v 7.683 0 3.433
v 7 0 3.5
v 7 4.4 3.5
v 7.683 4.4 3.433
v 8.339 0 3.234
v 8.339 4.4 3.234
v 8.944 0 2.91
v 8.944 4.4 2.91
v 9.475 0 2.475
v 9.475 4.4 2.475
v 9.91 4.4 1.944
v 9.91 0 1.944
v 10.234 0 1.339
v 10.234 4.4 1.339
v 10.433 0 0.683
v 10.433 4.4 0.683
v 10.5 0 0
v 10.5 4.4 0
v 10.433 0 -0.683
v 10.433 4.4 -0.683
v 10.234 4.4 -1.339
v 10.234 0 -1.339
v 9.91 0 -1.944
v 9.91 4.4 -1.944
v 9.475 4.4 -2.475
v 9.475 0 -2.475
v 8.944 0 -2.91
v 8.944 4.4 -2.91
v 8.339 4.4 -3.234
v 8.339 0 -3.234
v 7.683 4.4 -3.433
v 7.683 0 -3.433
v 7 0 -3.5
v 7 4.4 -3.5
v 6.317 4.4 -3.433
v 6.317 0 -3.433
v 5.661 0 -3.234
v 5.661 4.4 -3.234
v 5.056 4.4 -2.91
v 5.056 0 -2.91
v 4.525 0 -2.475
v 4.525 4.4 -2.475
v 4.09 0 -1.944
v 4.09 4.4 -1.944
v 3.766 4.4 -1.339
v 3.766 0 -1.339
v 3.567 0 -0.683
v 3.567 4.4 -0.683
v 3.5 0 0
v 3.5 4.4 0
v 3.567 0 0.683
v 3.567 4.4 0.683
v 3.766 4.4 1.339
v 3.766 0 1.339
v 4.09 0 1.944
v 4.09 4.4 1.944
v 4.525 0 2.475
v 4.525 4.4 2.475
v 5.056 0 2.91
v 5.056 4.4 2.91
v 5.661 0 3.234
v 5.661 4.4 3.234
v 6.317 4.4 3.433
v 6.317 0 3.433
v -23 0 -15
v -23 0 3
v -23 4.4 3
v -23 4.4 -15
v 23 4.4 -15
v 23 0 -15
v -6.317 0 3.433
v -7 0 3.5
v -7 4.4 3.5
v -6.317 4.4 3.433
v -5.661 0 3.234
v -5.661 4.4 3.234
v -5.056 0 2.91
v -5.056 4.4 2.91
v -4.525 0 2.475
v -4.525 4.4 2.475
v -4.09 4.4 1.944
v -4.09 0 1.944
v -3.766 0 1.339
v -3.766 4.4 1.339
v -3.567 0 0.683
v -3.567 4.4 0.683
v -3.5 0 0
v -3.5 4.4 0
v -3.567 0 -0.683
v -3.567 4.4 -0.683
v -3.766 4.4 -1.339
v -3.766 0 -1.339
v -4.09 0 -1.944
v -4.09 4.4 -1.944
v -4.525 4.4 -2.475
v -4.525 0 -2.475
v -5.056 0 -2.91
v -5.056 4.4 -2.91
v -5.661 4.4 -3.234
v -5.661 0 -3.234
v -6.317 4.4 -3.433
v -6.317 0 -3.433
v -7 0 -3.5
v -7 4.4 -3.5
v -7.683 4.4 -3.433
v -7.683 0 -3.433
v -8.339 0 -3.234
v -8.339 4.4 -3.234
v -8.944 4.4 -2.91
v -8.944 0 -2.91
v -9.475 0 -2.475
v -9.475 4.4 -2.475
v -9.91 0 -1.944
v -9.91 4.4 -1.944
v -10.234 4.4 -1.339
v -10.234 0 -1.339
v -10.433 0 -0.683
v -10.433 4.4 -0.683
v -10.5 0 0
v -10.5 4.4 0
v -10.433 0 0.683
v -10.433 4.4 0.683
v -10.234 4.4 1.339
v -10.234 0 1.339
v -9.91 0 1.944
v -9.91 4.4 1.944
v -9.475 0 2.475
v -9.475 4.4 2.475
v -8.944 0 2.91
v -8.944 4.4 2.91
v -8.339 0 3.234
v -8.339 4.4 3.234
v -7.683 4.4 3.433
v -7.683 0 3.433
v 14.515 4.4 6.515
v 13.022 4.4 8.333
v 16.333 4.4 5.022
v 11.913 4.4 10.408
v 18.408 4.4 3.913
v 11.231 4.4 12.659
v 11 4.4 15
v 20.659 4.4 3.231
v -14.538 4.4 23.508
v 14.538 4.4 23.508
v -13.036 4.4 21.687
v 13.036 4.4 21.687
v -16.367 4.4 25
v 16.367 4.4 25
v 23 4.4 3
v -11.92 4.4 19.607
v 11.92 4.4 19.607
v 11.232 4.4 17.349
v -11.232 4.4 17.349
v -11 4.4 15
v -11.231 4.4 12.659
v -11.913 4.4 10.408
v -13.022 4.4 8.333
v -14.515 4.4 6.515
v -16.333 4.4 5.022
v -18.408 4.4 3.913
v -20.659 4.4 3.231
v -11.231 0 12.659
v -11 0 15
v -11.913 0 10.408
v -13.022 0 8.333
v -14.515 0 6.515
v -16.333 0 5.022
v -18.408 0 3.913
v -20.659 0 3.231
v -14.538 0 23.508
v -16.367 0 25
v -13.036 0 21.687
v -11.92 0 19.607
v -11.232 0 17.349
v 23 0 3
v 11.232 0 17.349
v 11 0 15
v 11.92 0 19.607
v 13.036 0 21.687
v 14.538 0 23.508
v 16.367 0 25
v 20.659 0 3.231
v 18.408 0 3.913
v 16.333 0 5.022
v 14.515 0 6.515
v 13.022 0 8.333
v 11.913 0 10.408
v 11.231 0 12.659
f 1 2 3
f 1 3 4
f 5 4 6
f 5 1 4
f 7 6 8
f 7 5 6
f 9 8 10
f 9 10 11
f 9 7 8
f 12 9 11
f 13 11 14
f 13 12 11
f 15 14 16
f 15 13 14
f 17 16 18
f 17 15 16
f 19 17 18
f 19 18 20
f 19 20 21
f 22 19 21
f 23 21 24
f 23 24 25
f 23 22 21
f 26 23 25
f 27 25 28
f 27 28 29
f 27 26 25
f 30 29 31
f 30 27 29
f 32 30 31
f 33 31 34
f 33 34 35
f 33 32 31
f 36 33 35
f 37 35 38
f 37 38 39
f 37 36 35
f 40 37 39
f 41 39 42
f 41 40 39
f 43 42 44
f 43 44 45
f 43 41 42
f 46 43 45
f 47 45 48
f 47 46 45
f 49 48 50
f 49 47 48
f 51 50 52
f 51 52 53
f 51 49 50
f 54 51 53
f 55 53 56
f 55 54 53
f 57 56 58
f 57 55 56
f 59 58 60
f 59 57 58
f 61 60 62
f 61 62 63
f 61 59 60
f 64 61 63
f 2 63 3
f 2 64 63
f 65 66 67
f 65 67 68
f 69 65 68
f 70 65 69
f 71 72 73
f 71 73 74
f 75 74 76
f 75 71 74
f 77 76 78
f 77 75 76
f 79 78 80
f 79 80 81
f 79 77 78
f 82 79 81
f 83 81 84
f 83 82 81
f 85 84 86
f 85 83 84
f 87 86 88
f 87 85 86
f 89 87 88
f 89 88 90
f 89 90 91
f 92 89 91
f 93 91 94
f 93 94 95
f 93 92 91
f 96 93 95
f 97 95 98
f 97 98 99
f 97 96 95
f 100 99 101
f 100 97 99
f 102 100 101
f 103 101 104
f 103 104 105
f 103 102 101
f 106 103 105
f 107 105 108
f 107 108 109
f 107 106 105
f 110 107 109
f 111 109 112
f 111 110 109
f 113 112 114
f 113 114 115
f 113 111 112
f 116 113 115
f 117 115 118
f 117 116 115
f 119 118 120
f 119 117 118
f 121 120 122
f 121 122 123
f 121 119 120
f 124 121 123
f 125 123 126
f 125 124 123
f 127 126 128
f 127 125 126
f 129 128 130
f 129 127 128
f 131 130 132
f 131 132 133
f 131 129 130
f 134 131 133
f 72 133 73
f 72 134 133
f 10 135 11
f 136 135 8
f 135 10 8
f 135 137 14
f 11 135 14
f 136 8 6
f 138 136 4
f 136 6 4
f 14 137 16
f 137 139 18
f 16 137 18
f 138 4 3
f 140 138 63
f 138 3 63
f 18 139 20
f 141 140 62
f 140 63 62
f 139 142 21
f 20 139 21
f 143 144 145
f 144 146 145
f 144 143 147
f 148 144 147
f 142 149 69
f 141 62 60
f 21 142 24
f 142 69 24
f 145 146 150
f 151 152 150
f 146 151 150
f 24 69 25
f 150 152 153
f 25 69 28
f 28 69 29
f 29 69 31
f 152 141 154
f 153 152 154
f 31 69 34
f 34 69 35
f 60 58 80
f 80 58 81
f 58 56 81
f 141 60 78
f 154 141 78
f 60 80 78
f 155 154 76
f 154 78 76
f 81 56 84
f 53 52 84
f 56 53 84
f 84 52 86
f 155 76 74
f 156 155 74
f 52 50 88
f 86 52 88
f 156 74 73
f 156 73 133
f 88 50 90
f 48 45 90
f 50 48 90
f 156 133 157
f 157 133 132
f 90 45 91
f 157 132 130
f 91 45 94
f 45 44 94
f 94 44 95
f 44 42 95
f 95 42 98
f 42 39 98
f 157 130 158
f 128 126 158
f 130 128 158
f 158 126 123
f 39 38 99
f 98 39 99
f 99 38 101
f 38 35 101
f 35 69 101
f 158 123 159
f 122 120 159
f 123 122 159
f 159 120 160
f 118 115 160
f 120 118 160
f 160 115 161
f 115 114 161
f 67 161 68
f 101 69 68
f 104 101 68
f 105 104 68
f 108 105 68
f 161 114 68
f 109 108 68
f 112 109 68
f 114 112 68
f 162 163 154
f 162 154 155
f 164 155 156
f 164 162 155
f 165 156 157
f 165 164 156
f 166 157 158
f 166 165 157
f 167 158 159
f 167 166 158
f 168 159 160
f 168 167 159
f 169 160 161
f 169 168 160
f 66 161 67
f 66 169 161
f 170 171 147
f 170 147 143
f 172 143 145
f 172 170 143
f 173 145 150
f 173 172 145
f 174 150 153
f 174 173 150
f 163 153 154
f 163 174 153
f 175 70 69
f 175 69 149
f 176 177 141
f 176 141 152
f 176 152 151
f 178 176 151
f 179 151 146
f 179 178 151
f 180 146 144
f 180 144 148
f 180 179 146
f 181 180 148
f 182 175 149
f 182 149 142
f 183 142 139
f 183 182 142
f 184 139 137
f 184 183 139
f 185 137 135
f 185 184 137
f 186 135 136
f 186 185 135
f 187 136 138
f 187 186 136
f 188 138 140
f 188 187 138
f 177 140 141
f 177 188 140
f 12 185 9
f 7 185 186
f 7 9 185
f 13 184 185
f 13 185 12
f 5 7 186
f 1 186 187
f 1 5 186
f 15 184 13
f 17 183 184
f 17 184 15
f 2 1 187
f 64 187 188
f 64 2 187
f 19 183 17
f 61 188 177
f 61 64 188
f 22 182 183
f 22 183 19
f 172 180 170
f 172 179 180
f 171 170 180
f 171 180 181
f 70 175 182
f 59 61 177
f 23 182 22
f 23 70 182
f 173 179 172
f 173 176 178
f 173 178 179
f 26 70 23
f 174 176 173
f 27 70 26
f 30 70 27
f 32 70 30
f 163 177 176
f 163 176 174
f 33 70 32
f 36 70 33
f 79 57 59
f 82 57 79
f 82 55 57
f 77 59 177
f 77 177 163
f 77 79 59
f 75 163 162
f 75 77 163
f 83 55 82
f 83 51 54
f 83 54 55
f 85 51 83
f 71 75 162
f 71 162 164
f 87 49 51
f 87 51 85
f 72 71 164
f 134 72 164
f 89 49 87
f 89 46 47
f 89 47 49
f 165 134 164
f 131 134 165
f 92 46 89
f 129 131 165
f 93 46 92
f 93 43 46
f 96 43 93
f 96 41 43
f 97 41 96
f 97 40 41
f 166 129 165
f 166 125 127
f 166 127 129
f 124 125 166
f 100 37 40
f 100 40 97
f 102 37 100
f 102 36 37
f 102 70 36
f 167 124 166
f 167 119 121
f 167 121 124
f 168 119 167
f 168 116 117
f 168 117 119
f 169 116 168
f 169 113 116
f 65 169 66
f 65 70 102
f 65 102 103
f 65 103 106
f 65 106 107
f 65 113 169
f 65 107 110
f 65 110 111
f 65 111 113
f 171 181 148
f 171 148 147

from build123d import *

# Parameters (mm, degrees)
SKETCH1_R           = 3.5
BOSS_EXTRUDE1_DEPTH = 4.4


with BuildPart() as part:
    # Sketch1 → Boss-Extrude1 (new body)
    with BuildSketch(Plane(origin=(0, 0, 0), x_dir=(1, 0, 0), z_dir=(0, 1, 0))):
        with BuildLine():
            Line((-23, 15), (23, 15))
            Line((23, 15), (23, -3))
            ThreePointArc((23, -3), (14.514718626, -6.514718626), (11, -15))
            ThreePointArc((11, -15), (12.426471853, -20.674548662), (16.366750419, -25))
            Line((16.366750419, -25), (-16.366750419, -25))
            ThreePointArc((-16.366750419, -25), (-12.426471853, -20.674548662), (-11, -15))
            ThreePointArc((-11, -15), (-14.514718626, -6.514718626), (-23, -3))
            Line((-23, -3), (-23, 15))
        make_face()
        with Locations(Location((-7, 0, 0), (0, 0, 270))):
            Circle(SKETCH1_R, mode=Mode.SUBTRACT)
        with Locations(Location((7, 0, 0), (0, 0, 270))):
            Circle(SKETCH1_R, mode=Mode.SUBTRACT)
    extrude(amount=BOSS_EXTRUDE1_DEPTH)


solid = part.part
